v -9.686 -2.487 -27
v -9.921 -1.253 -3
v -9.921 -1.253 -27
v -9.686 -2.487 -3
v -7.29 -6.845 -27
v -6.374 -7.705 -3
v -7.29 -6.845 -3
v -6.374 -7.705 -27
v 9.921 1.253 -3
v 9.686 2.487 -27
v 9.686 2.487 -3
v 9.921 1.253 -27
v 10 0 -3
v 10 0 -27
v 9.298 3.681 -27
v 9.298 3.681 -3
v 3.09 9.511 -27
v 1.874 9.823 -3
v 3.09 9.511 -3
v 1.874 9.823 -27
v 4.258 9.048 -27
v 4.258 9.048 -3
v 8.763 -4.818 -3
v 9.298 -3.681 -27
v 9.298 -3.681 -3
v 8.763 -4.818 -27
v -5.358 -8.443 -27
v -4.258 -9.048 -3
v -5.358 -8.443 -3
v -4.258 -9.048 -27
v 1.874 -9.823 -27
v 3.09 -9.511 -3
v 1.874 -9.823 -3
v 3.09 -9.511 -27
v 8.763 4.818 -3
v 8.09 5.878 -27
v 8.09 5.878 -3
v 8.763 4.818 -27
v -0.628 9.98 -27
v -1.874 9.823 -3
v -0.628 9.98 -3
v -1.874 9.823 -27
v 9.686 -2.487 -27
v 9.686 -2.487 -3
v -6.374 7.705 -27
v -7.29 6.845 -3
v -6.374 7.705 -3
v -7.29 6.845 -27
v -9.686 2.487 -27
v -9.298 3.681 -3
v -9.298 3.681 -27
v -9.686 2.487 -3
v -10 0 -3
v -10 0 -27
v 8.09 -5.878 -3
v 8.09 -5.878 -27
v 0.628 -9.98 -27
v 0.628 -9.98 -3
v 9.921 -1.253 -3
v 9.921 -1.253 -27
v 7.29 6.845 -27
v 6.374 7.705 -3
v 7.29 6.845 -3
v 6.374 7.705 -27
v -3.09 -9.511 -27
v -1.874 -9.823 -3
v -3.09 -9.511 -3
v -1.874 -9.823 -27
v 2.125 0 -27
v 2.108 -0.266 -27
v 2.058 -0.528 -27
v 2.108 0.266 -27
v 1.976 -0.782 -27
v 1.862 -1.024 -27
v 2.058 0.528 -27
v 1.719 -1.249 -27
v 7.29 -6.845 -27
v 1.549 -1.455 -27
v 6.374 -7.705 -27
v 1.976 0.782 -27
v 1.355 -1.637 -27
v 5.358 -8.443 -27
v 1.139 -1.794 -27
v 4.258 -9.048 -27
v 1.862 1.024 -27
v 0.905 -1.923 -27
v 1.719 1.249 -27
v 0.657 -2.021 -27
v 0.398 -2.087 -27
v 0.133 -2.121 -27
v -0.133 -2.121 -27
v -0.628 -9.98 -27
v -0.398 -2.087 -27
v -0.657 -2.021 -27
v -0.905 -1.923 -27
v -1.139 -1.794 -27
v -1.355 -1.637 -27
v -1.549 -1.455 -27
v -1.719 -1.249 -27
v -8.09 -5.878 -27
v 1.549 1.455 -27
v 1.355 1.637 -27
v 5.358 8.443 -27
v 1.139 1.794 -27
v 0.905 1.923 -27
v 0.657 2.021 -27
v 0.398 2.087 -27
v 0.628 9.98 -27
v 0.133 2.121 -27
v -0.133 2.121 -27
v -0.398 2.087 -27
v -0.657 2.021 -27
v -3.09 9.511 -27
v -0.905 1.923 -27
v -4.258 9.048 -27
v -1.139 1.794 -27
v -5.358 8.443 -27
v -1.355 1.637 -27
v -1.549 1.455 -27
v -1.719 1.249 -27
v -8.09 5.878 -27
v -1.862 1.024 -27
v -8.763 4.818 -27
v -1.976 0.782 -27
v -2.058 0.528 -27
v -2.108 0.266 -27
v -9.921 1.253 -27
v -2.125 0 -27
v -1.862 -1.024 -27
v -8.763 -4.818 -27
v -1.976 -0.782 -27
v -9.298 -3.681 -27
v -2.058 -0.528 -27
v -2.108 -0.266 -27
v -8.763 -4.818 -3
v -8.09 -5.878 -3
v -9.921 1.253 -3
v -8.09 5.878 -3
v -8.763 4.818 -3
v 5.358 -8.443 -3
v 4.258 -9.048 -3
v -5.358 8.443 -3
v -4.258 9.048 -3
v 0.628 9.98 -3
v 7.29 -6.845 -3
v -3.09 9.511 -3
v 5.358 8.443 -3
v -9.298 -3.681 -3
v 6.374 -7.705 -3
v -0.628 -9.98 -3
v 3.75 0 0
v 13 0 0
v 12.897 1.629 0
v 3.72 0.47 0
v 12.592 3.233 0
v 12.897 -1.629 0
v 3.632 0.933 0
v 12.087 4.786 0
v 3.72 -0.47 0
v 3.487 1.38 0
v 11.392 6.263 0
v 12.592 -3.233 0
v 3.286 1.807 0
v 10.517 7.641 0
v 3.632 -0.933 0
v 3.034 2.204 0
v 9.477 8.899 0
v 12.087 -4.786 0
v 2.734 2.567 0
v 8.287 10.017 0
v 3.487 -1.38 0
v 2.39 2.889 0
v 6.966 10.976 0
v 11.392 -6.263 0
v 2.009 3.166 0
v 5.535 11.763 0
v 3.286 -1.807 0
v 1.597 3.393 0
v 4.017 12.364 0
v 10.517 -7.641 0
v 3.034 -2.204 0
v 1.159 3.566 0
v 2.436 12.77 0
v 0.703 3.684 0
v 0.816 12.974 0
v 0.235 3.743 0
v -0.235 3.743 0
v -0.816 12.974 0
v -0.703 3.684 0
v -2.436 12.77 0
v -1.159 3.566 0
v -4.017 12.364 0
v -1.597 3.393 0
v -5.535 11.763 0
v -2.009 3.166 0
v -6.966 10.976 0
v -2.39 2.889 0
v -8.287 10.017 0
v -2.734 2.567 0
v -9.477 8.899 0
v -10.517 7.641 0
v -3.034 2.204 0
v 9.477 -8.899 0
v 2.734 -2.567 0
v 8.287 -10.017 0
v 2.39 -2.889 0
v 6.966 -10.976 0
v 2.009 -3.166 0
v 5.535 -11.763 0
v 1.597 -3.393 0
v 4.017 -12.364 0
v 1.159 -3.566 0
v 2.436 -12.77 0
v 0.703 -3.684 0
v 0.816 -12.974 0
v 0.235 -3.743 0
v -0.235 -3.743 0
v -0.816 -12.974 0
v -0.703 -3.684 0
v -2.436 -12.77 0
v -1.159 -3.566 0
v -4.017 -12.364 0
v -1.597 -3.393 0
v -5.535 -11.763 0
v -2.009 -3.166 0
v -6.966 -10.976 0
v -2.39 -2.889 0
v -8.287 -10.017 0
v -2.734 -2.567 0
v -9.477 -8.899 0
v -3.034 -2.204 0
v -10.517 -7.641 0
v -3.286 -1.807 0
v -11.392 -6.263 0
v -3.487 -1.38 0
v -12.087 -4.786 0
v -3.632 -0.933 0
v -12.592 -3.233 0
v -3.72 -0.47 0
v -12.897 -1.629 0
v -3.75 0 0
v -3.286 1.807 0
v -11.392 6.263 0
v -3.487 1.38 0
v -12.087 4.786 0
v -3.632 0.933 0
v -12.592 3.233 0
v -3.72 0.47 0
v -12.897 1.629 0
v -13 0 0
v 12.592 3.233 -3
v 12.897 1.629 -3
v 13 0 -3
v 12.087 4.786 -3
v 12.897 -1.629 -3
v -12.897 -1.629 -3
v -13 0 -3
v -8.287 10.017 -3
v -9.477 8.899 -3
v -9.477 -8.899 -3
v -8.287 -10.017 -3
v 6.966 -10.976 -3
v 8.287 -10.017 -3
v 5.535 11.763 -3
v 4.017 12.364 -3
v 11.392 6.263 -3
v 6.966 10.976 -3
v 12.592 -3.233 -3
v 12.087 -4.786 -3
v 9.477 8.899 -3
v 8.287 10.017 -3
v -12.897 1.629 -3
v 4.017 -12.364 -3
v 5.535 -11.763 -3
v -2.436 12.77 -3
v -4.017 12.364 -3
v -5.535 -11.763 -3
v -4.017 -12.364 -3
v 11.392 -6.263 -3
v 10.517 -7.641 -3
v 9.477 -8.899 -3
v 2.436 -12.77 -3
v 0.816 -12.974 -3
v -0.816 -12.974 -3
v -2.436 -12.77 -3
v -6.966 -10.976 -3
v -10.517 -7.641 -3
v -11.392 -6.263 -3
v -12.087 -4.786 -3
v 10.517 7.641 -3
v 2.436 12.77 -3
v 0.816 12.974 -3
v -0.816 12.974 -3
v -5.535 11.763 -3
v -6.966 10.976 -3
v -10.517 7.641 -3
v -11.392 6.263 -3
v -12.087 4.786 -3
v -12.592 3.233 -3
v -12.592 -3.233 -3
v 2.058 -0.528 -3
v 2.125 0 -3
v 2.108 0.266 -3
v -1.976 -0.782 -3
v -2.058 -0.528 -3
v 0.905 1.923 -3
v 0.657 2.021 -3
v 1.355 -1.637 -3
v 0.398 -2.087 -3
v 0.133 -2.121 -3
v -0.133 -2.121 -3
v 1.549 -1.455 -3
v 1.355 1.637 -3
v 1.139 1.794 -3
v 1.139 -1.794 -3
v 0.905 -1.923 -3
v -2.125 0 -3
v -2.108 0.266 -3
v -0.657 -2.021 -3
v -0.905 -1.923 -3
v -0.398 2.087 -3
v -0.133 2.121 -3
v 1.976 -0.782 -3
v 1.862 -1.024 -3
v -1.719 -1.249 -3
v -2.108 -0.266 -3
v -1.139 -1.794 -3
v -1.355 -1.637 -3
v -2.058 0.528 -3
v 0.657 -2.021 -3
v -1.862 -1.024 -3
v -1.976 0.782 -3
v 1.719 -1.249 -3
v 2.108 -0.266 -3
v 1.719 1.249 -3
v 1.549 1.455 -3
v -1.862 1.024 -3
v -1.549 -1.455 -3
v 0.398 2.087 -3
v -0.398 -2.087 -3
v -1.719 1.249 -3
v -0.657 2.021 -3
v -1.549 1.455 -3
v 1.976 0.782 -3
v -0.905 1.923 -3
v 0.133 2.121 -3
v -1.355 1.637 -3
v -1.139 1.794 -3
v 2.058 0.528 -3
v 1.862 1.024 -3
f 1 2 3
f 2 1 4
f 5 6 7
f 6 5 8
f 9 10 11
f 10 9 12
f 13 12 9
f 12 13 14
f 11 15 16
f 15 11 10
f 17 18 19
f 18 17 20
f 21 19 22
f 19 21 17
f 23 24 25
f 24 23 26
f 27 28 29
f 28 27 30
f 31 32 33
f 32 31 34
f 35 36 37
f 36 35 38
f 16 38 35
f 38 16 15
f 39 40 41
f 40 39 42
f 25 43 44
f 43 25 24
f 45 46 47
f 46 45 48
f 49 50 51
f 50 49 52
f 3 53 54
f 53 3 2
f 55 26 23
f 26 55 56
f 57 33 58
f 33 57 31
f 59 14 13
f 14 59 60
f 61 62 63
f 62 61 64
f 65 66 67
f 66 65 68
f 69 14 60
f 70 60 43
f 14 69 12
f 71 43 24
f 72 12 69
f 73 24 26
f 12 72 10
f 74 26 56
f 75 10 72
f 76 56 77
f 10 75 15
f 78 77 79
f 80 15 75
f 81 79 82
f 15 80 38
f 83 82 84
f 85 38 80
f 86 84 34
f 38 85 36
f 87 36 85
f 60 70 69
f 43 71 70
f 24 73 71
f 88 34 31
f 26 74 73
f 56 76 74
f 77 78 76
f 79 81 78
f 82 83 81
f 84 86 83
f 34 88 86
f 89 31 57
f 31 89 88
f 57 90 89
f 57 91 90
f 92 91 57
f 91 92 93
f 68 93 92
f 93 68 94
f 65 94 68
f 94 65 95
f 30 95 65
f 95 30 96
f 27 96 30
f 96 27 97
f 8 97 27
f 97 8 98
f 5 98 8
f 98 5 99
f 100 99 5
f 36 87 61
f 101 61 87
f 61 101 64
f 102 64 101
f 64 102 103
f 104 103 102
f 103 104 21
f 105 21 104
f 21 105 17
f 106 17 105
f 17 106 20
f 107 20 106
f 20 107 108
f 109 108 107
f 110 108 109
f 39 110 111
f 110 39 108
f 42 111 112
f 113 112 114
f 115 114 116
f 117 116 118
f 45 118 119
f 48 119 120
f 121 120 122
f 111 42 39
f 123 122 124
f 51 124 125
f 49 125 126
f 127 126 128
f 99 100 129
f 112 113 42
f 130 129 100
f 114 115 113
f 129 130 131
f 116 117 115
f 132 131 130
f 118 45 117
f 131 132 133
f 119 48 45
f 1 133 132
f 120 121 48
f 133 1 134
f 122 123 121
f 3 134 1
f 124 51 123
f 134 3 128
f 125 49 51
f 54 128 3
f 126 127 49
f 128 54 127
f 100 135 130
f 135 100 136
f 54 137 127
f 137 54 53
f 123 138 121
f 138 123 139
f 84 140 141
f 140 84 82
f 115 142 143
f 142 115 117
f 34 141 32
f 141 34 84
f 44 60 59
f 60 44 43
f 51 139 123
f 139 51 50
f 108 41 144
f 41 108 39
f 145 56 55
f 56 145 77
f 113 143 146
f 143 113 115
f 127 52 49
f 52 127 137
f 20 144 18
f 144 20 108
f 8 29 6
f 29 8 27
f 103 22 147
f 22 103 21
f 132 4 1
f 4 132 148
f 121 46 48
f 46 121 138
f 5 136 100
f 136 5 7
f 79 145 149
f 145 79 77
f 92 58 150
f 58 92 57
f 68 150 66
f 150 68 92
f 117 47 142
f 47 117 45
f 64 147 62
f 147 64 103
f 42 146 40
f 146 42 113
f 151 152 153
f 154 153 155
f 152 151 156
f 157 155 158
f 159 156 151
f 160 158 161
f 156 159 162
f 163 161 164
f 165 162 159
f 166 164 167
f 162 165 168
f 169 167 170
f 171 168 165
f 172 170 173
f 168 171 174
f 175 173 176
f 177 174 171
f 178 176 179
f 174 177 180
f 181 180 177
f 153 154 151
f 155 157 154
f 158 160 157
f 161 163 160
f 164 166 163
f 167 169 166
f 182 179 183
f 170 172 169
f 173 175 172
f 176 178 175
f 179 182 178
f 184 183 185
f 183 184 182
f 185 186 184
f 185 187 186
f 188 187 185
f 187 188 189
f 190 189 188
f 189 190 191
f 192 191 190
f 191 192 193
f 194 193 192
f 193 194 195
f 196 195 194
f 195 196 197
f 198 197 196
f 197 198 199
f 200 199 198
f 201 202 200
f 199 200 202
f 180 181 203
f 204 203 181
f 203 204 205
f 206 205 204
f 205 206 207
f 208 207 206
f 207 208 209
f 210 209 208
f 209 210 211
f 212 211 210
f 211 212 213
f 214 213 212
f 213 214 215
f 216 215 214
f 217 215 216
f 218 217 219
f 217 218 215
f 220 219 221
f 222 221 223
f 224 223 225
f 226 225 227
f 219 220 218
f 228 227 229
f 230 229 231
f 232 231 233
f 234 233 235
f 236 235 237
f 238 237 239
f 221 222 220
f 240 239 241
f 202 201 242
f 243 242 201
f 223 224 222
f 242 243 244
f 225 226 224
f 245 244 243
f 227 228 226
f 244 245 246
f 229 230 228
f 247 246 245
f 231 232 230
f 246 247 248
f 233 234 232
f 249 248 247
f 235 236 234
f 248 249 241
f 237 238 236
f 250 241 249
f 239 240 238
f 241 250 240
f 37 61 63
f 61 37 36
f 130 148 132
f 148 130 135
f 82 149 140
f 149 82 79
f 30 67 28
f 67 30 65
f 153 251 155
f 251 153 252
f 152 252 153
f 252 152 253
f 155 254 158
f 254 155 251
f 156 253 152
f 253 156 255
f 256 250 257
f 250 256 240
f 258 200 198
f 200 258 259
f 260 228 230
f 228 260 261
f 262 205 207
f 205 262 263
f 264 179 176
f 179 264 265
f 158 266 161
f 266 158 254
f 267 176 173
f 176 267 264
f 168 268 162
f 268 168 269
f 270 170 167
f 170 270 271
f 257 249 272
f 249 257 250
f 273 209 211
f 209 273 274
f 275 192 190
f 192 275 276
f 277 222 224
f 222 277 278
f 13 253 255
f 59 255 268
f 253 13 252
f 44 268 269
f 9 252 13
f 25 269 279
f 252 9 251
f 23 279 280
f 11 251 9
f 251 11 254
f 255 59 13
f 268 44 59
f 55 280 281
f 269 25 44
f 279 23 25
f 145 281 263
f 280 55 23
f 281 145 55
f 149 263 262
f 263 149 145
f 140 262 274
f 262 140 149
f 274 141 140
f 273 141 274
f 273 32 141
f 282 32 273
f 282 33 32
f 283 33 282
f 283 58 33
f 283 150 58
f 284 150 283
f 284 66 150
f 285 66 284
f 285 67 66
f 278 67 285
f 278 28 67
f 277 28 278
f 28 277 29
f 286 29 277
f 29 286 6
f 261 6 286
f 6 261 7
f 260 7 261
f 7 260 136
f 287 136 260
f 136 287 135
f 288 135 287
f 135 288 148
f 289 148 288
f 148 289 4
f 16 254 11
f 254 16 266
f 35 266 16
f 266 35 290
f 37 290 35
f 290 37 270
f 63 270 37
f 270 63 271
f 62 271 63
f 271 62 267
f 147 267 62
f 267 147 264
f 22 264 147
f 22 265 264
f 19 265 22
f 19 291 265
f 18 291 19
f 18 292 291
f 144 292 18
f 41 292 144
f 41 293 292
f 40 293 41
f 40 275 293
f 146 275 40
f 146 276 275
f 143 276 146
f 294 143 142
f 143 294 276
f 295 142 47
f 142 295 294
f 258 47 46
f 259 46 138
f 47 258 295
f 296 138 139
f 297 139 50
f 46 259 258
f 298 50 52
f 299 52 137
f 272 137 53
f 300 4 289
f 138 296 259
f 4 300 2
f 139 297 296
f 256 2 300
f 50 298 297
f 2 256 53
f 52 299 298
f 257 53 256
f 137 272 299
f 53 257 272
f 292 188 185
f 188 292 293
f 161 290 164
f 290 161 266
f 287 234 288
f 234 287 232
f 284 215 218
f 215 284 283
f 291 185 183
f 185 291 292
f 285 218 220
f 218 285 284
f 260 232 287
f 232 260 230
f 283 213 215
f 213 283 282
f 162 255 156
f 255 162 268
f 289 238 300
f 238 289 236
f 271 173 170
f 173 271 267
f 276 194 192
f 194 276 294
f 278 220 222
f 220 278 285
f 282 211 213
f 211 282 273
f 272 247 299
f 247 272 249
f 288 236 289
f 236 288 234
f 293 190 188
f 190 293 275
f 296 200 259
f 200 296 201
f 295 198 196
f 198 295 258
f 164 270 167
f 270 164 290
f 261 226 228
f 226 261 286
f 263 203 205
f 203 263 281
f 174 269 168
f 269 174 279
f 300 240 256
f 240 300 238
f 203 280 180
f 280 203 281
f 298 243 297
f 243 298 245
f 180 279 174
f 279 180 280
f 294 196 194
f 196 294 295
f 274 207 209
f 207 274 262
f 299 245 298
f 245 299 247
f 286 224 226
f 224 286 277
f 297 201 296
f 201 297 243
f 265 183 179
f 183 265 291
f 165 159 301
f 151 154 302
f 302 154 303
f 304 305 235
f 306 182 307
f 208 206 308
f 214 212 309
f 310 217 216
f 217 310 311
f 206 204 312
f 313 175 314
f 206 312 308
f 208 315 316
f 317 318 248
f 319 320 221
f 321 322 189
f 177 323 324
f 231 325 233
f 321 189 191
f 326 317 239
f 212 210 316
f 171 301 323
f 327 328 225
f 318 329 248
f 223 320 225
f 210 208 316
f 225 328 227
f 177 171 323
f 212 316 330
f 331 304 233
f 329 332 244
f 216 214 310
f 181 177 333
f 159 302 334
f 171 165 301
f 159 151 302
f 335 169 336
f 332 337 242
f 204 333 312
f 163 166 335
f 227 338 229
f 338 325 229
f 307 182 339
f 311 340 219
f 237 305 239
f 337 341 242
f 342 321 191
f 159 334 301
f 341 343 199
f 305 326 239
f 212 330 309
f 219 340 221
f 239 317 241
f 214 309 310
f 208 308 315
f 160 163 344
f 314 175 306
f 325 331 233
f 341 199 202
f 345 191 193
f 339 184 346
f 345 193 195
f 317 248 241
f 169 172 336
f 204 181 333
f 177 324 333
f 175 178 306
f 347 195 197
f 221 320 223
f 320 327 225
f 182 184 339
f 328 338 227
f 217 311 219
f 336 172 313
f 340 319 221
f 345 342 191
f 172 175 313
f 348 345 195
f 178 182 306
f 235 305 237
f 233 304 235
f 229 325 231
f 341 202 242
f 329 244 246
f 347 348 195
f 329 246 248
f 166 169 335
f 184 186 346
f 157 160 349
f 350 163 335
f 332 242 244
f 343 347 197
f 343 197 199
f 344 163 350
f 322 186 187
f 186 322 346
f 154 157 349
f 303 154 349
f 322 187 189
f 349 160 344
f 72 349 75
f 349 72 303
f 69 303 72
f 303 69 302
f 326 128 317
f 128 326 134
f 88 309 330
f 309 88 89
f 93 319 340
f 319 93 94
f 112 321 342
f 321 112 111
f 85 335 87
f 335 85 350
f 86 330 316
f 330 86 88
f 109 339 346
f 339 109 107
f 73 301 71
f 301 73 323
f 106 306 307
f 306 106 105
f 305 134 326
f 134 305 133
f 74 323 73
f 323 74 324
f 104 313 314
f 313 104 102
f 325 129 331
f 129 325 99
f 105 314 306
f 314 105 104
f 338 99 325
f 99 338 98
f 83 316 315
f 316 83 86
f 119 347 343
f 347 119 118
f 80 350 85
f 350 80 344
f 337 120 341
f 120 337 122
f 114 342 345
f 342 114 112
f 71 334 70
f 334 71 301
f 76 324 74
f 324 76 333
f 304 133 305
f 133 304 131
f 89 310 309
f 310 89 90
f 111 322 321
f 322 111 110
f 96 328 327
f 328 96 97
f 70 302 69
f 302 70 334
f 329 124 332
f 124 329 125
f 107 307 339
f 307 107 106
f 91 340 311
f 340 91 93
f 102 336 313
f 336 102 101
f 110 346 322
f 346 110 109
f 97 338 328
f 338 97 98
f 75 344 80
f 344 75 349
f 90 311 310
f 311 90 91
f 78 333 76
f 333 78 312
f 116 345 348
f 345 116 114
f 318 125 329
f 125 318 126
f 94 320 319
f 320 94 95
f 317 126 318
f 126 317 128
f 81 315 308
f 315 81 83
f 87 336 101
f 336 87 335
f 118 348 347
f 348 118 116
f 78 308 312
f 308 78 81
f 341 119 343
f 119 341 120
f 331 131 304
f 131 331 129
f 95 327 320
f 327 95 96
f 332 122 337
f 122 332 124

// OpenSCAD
$fn = 50;


difference() {
	union() {
		translate(v = [0, 0, -27.0000000000]) {
			cylinder(h = 27, r = 10.0000000000);
		}
		translate(v = [0, 0, -3.0000000000]) {
			cylinder(h = 3, r = 13.0000000000);
		}
	}
	union() {
		translate(v = [0, 0, 0]) {
			rotate(a = [0, 0, 0]) {
				difference() {
					union() {
						#translate(v = [0, 0, -27.0000000000]) {
							cylinder(h = 27, r = 2.0000000000);
						}
						#translate(v = [0, 0, -3]) {
							cylinder(h = 3, r1 = 2.1250000000, r2 = 3.7500000000);
						}
						#translate(v = [0, 0, -27.0000000000]) {
							cylinder(h = 27, r = 2.1250000000);
						}
						#translate(v = [0, 0, -27.0000000000]) {
							cylinder(h = 27, r = 2.0000000000);
						}
					}
					union();
				}
			}
		}
	}
}
